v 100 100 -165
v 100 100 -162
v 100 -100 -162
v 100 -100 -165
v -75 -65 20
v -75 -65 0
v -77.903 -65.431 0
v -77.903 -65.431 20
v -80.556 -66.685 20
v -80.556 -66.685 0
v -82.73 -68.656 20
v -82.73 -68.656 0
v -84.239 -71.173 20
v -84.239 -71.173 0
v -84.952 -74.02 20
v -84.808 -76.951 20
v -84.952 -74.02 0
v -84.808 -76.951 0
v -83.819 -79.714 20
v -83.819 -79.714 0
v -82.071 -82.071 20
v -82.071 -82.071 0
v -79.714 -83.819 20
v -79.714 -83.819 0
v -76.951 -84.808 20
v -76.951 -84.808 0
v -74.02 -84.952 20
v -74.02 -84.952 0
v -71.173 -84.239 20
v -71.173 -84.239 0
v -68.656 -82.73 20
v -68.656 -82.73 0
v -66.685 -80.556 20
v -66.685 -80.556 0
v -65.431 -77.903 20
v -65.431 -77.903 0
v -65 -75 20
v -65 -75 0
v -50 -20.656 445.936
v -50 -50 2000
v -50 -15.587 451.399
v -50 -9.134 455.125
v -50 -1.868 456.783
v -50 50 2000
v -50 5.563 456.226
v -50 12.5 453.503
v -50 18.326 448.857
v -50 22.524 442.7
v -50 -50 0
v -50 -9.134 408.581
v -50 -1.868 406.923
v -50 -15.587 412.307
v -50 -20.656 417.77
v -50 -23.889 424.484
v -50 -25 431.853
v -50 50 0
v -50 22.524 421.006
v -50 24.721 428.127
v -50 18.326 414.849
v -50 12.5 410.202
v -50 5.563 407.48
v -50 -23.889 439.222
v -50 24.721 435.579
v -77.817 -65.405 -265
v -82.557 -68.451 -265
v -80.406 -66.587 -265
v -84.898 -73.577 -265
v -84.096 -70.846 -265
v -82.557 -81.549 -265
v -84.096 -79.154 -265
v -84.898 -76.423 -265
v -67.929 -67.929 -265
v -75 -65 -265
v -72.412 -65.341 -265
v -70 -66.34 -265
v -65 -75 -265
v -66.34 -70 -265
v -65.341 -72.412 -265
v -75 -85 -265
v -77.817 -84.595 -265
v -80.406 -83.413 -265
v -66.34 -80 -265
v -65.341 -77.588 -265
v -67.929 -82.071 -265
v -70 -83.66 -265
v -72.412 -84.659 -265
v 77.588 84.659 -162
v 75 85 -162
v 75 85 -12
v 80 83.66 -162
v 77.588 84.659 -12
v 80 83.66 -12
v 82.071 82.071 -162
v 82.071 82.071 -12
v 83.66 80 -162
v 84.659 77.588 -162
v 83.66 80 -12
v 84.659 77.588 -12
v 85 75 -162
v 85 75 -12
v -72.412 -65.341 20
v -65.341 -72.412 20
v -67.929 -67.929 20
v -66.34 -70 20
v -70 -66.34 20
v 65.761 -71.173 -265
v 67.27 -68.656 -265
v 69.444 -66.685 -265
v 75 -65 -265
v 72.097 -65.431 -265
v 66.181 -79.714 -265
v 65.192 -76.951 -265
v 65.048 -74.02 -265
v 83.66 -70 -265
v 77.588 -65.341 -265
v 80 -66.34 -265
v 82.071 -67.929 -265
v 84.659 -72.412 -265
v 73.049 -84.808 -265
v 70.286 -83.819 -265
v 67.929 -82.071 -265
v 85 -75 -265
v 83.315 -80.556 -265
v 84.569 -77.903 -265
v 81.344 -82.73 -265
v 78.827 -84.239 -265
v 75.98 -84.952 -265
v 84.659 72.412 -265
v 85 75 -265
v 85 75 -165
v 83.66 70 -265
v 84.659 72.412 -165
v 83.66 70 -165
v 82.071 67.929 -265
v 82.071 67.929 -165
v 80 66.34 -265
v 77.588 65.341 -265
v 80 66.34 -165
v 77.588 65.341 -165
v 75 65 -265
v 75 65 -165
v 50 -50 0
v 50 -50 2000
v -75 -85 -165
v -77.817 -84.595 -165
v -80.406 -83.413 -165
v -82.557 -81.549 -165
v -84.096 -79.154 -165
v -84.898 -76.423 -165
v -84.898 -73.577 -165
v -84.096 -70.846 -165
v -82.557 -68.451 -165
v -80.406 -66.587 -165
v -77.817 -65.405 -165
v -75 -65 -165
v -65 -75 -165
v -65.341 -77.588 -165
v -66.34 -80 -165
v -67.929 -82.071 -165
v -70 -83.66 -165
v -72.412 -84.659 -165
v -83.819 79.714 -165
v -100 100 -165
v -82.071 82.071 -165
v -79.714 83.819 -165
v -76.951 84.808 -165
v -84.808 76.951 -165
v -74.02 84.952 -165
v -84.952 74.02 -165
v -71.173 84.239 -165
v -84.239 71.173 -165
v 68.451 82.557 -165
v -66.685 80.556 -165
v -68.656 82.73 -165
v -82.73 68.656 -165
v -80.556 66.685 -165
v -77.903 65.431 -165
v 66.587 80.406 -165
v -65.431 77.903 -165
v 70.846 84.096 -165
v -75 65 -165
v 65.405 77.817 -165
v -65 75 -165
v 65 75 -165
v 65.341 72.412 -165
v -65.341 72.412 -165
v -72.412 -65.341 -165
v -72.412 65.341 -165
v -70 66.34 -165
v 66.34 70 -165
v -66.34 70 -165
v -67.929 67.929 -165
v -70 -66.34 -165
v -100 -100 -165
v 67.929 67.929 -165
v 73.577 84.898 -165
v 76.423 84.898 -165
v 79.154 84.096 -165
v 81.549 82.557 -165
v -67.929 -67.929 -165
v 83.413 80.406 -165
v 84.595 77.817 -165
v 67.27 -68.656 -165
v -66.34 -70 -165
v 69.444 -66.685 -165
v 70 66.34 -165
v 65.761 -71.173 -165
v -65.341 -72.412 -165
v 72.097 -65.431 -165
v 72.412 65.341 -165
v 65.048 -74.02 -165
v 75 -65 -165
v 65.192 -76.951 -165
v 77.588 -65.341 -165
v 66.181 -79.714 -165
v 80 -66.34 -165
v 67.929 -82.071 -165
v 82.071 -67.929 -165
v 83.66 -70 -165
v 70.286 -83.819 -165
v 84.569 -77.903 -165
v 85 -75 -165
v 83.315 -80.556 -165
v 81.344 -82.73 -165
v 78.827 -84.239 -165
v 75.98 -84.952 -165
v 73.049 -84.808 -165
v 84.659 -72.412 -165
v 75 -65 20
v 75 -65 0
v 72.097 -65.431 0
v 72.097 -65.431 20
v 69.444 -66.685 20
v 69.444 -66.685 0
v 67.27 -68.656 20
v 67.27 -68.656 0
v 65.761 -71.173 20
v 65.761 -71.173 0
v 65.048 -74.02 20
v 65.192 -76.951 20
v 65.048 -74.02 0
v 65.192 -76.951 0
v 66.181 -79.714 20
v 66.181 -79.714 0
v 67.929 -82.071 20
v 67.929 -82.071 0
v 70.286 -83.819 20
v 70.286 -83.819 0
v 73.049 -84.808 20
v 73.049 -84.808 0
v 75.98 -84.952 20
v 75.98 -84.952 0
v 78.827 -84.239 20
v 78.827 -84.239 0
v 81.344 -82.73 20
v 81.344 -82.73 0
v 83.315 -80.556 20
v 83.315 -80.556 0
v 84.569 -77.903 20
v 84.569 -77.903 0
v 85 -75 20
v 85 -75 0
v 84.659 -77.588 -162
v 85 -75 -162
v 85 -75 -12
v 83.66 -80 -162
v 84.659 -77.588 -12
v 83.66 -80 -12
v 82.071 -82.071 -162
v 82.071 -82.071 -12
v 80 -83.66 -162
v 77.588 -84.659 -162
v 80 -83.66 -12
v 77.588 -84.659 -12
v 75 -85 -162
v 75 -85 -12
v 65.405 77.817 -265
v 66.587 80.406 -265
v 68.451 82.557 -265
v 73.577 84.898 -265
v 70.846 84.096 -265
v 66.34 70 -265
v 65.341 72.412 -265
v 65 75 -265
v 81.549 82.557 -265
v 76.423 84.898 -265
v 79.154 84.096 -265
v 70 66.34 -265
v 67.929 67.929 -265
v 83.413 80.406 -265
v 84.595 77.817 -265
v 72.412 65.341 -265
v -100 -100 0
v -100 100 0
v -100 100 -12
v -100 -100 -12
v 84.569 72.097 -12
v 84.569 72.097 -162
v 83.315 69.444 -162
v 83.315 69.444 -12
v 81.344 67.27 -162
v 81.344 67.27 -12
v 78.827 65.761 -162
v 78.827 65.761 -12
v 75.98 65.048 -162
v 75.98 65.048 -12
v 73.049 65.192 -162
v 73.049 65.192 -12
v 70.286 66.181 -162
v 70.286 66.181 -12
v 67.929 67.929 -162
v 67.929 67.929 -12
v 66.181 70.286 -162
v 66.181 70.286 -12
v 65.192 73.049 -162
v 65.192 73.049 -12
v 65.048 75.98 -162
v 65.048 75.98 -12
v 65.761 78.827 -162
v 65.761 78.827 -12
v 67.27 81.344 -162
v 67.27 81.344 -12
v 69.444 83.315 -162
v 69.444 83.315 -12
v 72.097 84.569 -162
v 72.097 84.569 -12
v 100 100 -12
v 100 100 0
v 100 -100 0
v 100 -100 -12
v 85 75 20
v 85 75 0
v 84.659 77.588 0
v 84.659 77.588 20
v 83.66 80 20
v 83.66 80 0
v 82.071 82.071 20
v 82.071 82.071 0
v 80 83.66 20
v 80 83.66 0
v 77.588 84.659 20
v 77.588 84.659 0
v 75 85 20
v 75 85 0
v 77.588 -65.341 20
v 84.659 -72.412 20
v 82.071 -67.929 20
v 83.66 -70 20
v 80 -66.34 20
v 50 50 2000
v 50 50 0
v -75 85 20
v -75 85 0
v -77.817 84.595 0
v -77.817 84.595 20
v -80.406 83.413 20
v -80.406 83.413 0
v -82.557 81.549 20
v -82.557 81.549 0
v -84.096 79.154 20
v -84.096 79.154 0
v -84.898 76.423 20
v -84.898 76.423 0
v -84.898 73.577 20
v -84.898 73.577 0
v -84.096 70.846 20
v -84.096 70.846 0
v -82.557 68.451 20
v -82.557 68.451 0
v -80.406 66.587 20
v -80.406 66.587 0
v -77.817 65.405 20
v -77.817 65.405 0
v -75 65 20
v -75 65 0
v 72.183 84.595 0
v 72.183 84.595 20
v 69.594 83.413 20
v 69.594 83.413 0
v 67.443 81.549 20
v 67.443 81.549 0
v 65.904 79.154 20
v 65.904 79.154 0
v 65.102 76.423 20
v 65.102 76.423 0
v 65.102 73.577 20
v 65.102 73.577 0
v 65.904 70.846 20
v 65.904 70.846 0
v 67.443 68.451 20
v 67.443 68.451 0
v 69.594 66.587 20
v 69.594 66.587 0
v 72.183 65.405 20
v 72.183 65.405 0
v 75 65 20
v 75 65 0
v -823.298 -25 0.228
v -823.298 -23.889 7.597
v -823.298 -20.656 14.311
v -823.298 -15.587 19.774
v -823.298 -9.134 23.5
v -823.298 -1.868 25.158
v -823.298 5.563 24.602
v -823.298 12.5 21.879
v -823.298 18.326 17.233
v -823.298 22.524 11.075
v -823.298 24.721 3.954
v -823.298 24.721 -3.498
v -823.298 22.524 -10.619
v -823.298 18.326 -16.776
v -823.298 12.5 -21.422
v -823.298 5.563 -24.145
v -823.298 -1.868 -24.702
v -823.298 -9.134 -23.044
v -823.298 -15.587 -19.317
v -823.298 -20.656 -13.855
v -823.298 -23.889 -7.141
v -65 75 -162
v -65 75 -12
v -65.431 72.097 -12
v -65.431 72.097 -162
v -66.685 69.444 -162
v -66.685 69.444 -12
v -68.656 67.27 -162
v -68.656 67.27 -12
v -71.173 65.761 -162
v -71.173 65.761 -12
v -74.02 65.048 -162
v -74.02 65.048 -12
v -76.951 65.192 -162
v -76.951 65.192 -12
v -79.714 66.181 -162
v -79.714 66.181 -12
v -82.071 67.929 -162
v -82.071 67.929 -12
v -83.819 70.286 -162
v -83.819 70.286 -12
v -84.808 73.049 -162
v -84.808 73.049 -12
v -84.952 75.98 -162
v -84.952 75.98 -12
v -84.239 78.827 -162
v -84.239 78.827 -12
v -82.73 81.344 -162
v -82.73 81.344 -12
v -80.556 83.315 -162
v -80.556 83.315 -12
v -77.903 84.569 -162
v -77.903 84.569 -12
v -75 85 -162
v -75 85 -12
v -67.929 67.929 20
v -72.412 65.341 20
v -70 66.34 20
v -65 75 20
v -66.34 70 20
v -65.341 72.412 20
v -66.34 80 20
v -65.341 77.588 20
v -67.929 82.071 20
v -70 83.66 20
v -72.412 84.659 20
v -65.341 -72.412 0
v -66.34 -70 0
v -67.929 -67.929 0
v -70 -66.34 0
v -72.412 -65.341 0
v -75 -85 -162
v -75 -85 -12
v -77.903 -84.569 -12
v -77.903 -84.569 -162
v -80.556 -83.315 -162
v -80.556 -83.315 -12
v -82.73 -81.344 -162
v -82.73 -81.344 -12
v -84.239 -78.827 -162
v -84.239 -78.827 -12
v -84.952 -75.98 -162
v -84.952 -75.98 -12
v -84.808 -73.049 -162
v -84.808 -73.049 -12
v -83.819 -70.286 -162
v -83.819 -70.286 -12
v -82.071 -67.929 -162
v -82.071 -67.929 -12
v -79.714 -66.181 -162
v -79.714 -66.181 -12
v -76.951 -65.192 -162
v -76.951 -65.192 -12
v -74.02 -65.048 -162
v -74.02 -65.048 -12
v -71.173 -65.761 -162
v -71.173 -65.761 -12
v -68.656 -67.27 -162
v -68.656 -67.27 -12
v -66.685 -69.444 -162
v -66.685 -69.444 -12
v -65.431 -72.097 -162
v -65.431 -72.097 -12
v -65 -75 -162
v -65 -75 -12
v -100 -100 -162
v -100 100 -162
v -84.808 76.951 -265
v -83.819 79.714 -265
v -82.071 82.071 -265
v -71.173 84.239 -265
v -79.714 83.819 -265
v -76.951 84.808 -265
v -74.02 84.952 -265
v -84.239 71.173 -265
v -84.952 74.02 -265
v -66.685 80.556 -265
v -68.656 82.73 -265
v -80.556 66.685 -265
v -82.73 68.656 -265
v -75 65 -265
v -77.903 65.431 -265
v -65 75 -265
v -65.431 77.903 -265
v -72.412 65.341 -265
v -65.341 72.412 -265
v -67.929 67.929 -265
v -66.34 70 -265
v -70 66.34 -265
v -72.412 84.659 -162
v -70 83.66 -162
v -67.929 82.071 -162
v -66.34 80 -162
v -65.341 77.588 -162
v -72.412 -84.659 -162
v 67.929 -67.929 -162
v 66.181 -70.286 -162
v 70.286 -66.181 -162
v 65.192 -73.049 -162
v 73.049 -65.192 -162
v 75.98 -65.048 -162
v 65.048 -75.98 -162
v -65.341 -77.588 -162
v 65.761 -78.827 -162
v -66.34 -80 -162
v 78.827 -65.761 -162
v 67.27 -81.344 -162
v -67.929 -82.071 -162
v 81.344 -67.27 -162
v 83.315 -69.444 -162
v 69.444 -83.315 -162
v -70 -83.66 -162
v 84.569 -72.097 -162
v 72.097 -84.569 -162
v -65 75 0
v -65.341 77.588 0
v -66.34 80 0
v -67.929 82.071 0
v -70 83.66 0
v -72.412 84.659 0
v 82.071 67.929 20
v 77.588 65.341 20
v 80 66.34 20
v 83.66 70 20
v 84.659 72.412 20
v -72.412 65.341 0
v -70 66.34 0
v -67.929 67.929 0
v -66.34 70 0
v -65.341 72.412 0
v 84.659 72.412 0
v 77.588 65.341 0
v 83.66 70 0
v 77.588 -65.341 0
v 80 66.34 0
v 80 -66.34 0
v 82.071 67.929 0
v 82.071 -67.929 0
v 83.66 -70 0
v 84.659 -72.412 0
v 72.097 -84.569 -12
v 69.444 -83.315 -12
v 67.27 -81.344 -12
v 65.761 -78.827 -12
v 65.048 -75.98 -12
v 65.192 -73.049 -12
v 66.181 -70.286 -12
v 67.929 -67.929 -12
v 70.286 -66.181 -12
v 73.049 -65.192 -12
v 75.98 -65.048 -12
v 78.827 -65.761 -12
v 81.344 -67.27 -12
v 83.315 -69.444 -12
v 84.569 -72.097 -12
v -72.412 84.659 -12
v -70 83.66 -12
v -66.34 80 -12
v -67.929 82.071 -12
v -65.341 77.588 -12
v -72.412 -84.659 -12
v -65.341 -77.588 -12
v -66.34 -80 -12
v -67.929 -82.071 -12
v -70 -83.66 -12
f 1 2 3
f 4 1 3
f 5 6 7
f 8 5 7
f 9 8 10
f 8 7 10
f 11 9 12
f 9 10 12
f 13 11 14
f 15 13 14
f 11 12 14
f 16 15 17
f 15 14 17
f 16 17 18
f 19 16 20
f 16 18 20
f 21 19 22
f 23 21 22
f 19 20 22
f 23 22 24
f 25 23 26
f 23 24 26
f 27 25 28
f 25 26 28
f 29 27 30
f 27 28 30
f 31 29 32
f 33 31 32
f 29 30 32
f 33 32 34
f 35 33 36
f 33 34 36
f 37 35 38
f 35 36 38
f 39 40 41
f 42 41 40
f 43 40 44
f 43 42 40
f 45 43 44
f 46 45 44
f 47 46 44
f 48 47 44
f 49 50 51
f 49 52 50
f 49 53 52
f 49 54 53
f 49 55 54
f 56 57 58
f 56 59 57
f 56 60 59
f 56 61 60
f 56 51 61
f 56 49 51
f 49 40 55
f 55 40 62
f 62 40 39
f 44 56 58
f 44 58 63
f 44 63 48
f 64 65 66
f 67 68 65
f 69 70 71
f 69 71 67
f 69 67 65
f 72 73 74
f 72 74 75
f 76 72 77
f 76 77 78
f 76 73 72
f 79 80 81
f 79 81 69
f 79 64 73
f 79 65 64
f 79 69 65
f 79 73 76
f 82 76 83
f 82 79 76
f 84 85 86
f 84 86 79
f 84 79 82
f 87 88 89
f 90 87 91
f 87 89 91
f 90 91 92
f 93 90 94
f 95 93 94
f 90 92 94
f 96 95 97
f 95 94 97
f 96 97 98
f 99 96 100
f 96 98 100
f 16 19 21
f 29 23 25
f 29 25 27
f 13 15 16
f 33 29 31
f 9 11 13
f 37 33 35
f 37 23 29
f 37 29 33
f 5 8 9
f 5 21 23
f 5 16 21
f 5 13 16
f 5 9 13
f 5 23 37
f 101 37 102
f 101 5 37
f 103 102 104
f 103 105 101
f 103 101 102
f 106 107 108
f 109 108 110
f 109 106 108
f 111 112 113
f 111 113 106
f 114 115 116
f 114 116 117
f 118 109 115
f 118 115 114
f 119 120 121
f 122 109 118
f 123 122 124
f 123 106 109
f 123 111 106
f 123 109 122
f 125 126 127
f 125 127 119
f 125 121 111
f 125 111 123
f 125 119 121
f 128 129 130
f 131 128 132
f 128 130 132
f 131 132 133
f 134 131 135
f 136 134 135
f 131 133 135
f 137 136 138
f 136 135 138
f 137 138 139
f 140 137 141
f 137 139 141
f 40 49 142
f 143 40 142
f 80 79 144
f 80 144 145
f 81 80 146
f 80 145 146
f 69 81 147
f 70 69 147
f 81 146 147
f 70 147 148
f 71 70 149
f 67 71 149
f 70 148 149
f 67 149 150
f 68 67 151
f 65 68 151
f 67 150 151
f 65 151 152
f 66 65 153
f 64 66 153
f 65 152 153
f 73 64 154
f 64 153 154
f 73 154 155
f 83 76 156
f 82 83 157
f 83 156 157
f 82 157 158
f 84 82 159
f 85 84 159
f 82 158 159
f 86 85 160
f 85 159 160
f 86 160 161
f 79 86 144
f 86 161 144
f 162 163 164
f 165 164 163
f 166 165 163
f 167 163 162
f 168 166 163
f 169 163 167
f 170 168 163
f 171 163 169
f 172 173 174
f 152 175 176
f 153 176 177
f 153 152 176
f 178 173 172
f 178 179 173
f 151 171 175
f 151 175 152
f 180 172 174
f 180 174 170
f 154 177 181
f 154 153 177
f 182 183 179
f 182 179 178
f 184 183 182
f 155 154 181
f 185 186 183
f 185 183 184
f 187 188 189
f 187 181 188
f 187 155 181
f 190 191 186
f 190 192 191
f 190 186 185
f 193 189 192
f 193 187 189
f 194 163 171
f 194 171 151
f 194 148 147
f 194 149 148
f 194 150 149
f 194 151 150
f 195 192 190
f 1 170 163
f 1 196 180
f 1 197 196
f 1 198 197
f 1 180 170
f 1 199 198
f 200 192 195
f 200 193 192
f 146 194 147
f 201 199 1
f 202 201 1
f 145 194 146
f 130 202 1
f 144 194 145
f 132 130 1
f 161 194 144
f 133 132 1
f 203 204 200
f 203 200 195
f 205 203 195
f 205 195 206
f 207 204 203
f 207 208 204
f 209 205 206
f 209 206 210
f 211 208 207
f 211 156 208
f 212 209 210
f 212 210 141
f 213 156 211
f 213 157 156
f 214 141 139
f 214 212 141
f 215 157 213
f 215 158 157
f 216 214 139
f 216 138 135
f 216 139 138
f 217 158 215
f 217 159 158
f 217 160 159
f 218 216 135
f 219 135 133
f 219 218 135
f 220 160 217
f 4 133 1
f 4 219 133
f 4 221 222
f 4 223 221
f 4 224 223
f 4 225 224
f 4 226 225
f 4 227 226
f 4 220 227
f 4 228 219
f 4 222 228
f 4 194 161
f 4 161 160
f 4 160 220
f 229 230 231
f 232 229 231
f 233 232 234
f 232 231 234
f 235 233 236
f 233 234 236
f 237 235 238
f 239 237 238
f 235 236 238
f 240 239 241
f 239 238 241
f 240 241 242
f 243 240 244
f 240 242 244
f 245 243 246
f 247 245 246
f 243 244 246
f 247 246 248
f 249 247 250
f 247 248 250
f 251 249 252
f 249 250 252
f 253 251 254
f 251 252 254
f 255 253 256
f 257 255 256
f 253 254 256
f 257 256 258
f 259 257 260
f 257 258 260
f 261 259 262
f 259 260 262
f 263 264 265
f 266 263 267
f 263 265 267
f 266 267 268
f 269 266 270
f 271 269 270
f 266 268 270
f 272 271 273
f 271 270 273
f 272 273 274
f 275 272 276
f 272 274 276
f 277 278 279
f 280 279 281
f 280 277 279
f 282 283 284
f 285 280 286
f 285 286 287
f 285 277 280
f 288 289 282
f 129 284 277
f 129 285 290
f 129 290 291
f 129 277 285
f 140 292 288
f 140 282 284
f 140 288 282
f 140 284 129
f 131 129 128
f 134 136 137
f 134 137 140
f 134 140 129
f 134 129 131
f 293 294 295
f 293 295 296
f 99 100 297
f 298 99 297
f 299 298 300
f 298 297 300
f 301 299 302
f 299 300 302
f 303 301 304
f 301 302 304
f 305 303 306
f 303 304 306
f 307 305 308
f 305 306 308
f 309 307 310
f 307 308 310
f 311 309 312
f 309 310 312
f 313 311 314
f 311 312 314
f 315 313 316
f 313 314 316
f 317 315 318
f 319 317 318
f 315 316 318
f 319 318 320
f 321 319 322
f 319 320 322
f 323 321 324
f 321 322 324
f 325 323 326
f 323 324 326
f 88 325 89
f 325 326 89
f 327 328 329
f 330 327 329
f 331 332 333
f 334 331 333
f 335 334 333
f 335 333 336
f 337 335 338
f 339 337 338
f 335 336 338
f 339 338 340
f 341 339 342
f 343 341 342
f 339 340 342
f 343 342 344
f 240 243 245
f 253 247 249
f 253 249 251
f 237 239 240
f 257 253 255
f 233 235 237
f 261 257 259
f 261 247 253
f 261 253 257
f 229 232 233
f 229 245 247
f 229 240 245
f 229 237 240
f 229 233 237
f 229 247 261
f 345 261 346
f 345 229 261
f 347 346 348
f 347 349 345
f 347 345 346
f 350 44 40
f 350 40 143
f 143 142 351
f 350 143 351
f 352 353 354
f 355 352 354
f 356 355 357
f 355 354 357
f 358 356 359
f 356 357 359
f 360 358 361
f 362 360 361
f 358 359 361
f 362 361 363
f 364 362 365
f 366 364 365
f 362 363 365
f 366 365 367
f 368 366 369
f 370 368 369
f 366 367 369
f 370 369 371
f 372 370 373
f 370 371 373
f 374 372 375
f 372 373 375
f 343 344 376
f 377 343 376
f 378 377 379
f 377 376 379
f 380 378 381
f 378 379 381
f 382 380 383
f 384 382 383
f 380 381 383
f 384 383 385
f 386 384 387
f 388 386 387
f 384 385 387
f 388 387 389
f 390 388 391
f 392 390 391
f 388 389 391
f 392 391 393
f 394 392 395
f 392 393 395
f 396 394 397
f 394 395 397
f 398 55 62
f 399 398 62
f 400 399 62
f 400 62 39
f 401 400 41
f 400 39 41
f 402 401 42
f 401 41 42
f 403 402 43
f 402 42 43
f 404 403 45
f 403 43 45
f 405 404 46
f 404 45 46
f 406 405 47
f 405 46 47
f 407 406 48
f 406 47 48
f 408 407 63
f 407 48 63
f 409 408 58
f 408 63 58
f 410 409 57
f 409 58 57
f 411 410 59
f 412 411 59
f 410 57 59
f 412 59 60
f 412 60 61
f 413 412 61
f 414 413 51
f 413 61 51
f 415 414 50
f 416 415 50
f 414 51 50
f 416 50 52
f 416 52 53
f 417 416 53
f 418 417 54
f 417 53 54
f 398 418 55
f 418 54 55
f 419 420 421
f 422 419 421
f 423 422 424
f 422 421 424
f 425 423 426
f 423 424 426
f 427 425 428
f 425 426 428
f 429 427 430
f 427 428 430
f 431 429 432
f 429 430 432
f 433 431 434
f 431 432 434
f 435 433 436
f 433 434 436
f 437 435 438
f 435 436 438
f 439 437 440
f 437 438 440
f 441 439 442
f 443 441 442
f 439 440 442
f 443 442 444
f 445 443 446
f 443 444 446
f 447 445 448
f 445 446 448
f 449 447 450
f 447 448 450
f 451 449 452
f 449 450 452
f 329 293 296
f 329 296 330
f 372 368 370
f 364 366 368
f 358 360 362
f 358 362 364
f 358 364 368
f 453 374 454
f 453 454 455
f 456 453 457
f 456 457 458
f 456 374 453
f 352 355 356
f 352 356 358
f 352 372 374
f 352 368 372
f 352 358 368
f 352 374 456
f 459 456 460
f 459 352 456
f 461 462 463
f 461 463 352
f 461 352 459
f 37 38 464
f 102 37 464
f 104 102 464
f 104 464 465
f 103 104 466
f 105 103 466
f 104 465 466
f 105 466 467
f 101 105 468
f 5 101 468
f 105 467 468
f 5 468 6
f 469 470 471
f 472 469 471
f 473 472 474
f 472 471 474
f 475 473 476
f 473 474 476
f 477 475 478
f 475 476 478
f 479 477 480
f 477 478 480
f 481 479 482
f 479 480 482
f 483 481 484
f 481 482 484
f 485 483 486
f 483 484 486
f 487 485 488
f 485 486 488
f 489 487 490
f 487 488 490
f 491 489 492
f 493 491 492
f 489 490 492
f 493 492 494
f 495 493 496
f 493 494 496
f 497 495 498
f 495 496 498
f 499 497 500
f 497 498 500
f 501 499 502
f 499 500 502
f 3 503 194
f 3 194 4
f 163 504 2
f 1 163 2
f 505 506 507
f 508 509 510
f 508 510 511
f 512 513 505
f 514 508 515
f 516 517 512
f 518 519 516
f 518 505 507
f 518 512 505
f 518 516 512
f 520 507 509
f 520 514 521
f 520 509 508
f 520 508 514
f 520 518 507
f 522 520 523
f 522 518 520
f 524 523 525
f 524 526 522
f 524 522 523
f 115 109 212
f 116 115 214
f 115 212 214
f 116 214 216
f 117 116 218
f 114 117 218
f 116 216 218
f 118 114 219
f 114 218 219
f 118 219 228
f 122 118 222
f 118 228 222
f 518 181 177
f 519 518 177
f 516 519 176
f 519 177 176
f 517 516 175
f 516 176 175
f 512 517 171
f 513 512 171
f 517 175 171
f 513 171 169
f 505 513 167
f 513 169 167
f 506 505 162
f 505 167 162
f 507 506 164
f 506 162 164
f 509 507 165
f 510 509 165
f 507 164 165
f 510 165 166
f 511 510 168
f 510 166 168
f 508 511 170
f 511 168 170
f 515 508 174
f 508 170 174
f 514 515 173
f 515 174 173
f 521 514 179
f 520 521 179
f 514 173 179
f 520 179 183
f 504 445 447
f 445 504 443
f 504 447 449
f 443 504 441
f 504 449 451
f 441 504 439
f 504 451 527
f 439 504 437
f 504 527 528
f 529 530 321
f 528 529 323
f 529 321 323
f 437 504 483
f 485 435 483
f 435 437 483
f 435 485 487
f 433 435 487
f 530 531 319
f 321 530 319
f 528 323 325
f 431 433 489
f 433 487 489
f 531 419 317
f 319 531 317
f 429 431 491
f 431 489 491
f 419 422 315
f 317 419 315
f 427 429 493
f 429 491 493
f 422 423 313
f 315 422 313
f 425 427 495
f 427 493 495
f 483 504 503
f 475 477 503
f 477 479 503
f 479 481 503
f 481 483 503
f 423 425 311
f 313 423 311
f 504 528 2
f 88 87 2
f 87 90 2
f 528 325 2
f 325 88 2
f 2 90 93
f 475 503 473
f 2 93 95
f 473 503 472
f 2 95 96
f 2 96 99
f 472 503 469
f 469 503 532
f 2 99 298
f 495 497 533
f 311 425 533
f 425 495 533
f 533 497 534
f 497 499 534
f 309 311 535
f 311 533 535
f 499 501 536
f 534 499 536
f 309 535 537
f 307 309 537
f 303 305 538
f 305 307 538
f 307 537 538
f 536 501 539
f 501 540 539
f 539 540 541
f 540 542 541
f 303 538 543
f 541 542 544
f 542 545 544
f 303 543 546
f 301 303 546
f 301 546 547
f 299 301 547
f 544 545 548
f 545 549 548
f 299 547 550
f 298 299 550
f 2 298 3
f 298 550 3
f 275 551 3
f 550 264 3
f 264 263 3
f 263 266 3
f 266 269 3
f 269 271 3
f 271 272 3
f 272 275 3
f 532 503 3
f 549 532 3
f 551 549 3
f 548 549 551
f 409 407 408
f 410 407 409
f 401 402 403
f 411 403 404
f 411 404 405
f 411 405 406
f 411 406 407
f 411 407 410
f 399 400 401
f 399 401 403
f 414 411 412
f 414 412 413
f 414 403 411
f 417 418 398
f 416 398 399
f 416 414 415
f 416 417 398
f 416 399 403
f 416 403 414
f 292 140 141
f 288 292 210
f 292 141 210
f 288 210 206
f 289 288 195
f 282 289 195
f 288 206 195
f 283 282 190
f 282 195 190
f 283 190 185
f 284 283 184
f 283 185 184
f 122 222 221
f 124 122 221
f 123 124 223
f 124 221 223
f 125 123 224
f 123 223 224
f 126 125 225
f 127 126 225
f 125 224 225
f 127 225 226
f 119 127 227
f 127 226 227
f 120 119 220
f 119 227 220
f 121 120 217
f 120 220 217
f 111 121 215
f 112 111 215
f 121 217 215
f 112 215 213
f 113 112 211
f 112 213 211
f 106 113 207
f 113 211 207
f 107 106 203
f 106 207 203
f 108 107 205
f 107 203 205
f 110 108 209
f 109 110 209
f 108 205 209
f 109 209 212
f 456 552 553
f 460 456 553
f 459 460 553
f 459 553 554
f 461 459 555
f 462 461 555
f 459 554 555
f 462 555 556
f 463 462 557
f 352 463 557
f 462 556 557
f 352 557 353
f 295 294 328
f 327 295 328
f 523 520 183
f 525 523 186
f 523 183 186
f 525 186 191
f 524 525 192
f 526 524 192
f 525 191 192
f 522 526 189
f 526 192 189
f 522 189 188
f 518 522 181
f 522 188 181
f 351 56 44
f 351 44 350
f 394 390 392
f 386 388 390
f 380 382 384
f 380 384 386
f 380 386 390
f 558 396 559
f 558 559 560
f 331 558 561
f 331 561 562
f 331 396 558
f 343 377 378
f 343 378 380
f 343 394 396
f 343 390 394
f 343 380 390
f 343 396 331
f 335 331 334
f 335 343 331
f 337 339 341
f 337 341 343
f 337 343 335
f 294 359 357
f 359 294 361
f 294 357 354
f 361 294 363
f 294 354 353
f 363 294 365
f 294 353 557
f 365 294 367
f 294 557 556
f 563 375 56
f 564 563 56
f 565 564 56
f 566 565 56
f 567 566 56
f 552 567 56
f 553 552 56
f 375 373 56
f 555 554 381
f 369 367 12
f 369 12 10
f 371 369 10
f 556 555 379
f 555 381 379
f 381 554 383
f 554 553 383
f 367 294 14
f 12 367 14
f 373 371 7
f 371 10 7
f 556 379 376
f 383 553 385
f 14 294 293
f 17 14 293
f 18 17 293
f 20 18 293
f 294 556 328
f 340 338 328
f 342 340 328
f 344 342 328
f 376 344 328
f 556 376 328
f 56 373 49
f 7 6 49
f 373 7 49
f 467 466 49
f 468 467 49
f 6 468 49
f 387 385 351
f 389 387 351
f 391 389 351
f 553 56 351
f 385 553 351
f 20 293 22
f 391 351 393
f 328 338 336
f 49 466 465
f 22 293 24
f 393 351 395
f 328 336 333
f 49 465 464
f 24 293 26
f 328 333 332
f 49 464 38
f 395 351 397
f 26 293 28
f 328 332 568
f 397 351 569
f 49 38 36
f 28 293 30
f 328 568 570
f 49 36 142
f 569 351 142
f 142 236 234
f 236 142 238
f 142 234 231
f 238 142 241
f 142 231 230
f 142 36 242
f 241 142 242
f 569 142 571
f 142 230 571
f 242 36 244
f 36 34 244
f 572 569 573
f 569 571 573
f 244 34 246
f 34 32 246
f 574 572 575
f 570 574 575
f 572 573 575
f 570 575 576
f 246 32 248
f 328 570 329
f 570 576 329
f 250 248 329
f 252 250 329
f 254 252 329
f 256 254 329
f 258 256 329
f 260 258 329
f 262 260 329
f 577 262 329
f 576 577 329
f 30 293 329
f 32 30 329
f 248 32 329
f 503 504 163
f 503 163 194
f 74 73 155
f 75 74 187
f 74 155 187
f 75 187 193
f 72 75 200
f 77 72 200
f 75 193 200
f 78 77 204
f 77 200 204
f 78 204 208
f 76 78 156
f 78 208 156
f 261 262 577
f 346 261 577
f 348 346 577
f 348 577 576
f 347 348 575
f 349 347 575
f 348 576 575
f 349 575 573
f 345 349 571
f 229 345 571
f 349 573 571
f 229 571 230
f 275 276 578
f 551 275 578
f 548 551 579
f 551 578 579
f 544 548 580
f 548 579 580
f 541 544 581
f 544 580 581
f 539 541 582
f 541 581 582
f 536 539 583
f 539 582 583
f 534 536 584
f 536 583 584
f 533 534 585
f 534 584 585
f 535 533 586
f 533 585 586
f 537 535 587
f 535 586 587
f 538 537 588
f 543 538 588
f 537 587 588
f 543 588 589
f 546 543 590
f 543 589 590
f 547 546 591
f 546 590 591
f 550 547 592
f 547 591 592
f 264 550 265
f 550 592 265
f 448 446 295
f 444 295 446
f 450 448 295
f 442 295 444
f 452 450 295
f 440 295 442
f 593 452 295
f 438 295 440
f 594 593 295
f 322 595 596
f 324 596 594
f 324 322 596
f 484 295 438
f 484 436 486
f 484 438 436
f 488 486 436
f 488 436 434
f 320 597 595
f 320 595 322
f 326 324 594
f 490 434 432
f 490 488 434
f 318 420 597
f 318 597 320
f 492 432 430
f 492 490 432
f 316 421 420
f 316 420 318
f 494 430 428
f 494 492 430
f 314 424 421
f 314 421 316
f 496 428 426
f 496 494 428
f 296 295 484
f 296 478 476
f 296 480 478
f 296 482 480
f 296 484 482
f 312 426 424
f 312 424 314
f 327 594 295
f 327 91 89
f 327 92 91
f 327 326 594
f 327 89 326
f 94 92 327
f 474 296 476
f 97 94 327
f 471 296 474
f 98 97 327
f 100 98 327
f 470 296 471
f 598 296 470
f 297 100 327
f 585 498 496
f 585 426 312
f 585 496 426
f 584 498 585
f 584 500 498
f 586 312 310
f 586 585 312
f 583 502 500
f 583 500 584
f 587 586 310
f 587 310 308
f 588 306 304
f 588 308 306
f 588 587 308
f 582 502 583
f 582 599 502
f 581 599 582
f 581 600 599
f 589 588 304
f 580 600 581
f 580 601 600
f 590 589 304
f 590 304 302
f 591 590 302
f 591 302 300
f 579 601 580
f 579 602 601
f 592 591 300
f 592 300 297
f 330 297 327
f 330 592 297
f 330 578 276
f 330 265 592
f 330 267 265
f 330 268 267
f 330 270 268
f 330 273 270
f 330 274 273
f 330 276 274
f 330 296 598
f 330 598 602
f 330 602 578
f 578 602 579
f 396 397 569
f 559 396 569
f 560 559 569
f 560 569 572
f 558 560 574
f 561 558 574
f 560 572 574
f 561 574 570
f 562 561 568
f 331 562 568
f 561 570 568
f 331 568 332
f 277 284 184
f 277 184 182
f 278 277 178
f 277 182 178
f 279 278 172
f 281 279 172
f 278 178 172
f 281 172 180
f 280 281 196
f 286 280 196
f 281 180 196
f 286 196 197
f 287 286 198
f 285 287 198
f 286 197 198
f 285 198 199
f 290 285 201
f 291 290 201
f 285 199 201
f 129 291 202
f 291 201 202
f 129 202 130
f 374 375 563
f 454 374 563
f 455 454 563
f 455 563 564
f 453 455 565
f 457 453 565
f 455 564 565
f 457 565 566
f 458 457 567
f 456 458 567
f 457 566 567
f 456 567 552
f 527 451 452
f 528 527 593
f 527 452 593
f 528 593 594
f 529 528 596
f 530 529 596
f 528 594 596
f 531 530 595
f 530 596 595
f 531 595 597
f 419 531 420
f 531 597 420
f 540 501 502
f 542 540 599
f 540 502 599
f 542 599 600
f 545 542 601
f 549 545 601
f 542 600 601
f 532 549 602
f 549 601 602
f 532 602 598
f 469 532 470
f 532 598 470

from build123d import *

# Parameters (mm, degrees)
F0_W      = 100
F0_H      = 100
F1_DEPTH  = 2000
F2_W      = 200
F2_H      = 200
F3_DEPTH  = 12
F5_DEPTH  = 150
F7_DEPTH  = 20
F8_W      = 200
F8_H      = 200
F9_DEPTH  = 3
F11_DEPTH = 100
F13_R     = 25


with BuildPart() as f1:
    # F0 (on Top) → F1 (new body)
    with BuildSketch(Plane.XY):
        Rectangle(F0_W, F0_H)
    extrude(amount=F1_DEPTH)

    # F2 (on face) → F3 (join)
    with BuildSketch(Plane(origin=(0, 0, 0), x_dir=(1, 0, 0), z_dir=(0, 0, -1))):
        Rectangle(F2_W, F2_H)
    extrude(amount=F3_DEPTH)

    # F4 (on face) → F5 (join)
    with BuildSketch(Plane(origin=(0, 0, -12), x_dir=(1, 0, 0), z_dir=(0, 0, -1))):
        with BuildLine():
            ThreePointArc((-75, 85), (-82.0710678119, 67.9289321881), (-65, 75))
            ThreePointArc((-65, 75), (-67.9289321881, 82.0710678119), (-75, 85))
        make_face()
        with BuildLine():
            ThreePointArc((75, 85), (67.9289321881, 67.9289321881), (85, 75))
            ThreePointArc((85, 75), (82.0710678119, 82.0710678119), (75, 85))
        make_face()
        with BuildLine():
            ThreePointArc((-75, -85), (-67.9289321881, -82.0710678119), (-65, -75))
            ThreePointArc((-65, -75), (-82.0710678119, -67.9289321881), (-75, -85))
        make_face()
        with BuildLine():
            ThreePointArc((75, -85), (82.0710678119, -82.0710678119), (85, -75))
            ThreePointArc((85, -75), (67.9289321881, -67.9289321881), (75, -85))
        make_face()
    extrude(amount=F5_DEPTH)

    # F6 (on face) → F7 (join)
    with BuildSketch(Plane.XY):
        with BuildLine():
            ThreePointArc((-65, 75), (-67.9289321881, 82.0710678119), (-75, 85))
            Line((-75, 85), (-75, 75))
            Line((-75, 75), (-75, 65))
            ThreePointArc((-75, 65), (-67.9289321881, 67.9289321881), (-65, 75))
        make_face()
        with BuildLine():
            ThreePointArc((-65, -75), (-67.9289321881, -67.9289321881), (-75, -65))
            ThreePointArc((-75, -65), (-82.0710678119, -82.0710678119), (-65, -75))
        make_face()
        with BuildLine():
            Line((-75, 75), (-75, 85))
            ThreePointArc((-75, 85), (-85, 75), (-75, 65))
            Line((-75, 65), (-75, 75))
        make_face()
        with BuildLine():
            ThreePointArc((85, 75), (82.0710678119, 82.0710678119), (75, 85))
            Line((75, 85), (75, 75))
            Line((75, 75), (75, 65))
            ThreePointArc((75, 65), (82.0710678119, 67.9289321881), (85, 75))
        make_face()
        with BuildLine():
            ThreePointArc((85, -75), (82.0710678119, -67.9289321881), (75, -65))
            ThreePointArc((75, -65), (67.9289321881, -82.0710678119), (85, -75))
        make_face()
        with BuildLine():
            Line((75, 75), (75, 85))
            ThreePointArc((75, 85), (65, 75), (75, 65))
            Line((75, 65), (75, 75))
        make_face()
    extrude(amount=F7_DEPTH)

    # F8 (on face) → F9 (join)
    with BuildSketch(Plane(origin=(0, 0, -162), x_dir=(1, 0, 0), z_dir=(0, 0, -1))):
        Rectangle(F8_W, F8_H)
    extrude(amount=F9_DEPTH)

    # F10 (on face) → F11 (join)
    with BuildSketch(Plane(origin=(0, 0, -165), x_dir=(1, 0, 0), z_dir=(0, 0, -1))):
        with BuildLine():
            ThreePointArc((-65, 75), (-67.9289321881, 82.0710678119), (-75, 85))
            Line((-75, 85), (-75, 75))
            Line((-75, 75), (-75, 65))
            ThreePointArc((-75, 65), (-67.9289321881, 67.9289321881), (-65, 75))
        make_face()
        with BuildLine():
            ThreePointArc((85, 75), (67.9289321881, 82.0710678119), (75, 65))
            ThreePointArc((75, 65), (82.0710678119, 67.9289321881), (85, 75))
        make_face()
        with BuildLine():
            ThreePointArc((75, -65), (67.9289321881, -67.9289321881), (65, -75))
            Line((65, -75), (75, -75))
            Line((75, -75), (75, -65))
        make_face()
        with BuildLine():
            Line((75, -75), (65, -75))
            ThreePointArc((65, -75), (75, -85), (85, -75))
            ThreePointArc((85, -75), (82.0710678119, -67.9289321881), (75, -65))
            Line((75, -65), (75, -75))
        make_face()
        with BuildLine():
            ThreePointArc((-65, -75), (-67.9289321881, -67.9289321881), (-75, -65))
            Line((-75, -65), (-75, -75))
            Line((-75, -75), (-65, -75))
        make_face()
        with BuildLine():
            Line((-75, -75), (-75, -65))
            ThreePointArc((-75, -65), (-82.0710678119, -82.0710678119), (-65, -75))
            Line((-65, -75), (-75, -75))
        make_face()
        with BuildLine():
            Line((-75, 75), (-75, 85))
            ThreePointArc((-75, 85), (-85, 75), (-75, 65))
            Line((-75, 65), (-75, 75))
        make_face()
    extrude(amount=F11_DEPTH)

    # F14: sweep along a path in F12
    with BuildLine(Plane.XZ) as f14_path:
        Line((-823.6663937569, 0), (-50.3681525588, 431.6245317459))
    # F13 (on face) → F14 (sweep)
    with BuildSketch(Plane(origin=(-50, 0, 0), x_dir=(0, -1, 0), z_dir=(-1, 0, 0))):
        with Locations((0, 431.8528473377)):
            Circle(F13_R)
    sweep(path=f14_path.line)


solid = f1.part
